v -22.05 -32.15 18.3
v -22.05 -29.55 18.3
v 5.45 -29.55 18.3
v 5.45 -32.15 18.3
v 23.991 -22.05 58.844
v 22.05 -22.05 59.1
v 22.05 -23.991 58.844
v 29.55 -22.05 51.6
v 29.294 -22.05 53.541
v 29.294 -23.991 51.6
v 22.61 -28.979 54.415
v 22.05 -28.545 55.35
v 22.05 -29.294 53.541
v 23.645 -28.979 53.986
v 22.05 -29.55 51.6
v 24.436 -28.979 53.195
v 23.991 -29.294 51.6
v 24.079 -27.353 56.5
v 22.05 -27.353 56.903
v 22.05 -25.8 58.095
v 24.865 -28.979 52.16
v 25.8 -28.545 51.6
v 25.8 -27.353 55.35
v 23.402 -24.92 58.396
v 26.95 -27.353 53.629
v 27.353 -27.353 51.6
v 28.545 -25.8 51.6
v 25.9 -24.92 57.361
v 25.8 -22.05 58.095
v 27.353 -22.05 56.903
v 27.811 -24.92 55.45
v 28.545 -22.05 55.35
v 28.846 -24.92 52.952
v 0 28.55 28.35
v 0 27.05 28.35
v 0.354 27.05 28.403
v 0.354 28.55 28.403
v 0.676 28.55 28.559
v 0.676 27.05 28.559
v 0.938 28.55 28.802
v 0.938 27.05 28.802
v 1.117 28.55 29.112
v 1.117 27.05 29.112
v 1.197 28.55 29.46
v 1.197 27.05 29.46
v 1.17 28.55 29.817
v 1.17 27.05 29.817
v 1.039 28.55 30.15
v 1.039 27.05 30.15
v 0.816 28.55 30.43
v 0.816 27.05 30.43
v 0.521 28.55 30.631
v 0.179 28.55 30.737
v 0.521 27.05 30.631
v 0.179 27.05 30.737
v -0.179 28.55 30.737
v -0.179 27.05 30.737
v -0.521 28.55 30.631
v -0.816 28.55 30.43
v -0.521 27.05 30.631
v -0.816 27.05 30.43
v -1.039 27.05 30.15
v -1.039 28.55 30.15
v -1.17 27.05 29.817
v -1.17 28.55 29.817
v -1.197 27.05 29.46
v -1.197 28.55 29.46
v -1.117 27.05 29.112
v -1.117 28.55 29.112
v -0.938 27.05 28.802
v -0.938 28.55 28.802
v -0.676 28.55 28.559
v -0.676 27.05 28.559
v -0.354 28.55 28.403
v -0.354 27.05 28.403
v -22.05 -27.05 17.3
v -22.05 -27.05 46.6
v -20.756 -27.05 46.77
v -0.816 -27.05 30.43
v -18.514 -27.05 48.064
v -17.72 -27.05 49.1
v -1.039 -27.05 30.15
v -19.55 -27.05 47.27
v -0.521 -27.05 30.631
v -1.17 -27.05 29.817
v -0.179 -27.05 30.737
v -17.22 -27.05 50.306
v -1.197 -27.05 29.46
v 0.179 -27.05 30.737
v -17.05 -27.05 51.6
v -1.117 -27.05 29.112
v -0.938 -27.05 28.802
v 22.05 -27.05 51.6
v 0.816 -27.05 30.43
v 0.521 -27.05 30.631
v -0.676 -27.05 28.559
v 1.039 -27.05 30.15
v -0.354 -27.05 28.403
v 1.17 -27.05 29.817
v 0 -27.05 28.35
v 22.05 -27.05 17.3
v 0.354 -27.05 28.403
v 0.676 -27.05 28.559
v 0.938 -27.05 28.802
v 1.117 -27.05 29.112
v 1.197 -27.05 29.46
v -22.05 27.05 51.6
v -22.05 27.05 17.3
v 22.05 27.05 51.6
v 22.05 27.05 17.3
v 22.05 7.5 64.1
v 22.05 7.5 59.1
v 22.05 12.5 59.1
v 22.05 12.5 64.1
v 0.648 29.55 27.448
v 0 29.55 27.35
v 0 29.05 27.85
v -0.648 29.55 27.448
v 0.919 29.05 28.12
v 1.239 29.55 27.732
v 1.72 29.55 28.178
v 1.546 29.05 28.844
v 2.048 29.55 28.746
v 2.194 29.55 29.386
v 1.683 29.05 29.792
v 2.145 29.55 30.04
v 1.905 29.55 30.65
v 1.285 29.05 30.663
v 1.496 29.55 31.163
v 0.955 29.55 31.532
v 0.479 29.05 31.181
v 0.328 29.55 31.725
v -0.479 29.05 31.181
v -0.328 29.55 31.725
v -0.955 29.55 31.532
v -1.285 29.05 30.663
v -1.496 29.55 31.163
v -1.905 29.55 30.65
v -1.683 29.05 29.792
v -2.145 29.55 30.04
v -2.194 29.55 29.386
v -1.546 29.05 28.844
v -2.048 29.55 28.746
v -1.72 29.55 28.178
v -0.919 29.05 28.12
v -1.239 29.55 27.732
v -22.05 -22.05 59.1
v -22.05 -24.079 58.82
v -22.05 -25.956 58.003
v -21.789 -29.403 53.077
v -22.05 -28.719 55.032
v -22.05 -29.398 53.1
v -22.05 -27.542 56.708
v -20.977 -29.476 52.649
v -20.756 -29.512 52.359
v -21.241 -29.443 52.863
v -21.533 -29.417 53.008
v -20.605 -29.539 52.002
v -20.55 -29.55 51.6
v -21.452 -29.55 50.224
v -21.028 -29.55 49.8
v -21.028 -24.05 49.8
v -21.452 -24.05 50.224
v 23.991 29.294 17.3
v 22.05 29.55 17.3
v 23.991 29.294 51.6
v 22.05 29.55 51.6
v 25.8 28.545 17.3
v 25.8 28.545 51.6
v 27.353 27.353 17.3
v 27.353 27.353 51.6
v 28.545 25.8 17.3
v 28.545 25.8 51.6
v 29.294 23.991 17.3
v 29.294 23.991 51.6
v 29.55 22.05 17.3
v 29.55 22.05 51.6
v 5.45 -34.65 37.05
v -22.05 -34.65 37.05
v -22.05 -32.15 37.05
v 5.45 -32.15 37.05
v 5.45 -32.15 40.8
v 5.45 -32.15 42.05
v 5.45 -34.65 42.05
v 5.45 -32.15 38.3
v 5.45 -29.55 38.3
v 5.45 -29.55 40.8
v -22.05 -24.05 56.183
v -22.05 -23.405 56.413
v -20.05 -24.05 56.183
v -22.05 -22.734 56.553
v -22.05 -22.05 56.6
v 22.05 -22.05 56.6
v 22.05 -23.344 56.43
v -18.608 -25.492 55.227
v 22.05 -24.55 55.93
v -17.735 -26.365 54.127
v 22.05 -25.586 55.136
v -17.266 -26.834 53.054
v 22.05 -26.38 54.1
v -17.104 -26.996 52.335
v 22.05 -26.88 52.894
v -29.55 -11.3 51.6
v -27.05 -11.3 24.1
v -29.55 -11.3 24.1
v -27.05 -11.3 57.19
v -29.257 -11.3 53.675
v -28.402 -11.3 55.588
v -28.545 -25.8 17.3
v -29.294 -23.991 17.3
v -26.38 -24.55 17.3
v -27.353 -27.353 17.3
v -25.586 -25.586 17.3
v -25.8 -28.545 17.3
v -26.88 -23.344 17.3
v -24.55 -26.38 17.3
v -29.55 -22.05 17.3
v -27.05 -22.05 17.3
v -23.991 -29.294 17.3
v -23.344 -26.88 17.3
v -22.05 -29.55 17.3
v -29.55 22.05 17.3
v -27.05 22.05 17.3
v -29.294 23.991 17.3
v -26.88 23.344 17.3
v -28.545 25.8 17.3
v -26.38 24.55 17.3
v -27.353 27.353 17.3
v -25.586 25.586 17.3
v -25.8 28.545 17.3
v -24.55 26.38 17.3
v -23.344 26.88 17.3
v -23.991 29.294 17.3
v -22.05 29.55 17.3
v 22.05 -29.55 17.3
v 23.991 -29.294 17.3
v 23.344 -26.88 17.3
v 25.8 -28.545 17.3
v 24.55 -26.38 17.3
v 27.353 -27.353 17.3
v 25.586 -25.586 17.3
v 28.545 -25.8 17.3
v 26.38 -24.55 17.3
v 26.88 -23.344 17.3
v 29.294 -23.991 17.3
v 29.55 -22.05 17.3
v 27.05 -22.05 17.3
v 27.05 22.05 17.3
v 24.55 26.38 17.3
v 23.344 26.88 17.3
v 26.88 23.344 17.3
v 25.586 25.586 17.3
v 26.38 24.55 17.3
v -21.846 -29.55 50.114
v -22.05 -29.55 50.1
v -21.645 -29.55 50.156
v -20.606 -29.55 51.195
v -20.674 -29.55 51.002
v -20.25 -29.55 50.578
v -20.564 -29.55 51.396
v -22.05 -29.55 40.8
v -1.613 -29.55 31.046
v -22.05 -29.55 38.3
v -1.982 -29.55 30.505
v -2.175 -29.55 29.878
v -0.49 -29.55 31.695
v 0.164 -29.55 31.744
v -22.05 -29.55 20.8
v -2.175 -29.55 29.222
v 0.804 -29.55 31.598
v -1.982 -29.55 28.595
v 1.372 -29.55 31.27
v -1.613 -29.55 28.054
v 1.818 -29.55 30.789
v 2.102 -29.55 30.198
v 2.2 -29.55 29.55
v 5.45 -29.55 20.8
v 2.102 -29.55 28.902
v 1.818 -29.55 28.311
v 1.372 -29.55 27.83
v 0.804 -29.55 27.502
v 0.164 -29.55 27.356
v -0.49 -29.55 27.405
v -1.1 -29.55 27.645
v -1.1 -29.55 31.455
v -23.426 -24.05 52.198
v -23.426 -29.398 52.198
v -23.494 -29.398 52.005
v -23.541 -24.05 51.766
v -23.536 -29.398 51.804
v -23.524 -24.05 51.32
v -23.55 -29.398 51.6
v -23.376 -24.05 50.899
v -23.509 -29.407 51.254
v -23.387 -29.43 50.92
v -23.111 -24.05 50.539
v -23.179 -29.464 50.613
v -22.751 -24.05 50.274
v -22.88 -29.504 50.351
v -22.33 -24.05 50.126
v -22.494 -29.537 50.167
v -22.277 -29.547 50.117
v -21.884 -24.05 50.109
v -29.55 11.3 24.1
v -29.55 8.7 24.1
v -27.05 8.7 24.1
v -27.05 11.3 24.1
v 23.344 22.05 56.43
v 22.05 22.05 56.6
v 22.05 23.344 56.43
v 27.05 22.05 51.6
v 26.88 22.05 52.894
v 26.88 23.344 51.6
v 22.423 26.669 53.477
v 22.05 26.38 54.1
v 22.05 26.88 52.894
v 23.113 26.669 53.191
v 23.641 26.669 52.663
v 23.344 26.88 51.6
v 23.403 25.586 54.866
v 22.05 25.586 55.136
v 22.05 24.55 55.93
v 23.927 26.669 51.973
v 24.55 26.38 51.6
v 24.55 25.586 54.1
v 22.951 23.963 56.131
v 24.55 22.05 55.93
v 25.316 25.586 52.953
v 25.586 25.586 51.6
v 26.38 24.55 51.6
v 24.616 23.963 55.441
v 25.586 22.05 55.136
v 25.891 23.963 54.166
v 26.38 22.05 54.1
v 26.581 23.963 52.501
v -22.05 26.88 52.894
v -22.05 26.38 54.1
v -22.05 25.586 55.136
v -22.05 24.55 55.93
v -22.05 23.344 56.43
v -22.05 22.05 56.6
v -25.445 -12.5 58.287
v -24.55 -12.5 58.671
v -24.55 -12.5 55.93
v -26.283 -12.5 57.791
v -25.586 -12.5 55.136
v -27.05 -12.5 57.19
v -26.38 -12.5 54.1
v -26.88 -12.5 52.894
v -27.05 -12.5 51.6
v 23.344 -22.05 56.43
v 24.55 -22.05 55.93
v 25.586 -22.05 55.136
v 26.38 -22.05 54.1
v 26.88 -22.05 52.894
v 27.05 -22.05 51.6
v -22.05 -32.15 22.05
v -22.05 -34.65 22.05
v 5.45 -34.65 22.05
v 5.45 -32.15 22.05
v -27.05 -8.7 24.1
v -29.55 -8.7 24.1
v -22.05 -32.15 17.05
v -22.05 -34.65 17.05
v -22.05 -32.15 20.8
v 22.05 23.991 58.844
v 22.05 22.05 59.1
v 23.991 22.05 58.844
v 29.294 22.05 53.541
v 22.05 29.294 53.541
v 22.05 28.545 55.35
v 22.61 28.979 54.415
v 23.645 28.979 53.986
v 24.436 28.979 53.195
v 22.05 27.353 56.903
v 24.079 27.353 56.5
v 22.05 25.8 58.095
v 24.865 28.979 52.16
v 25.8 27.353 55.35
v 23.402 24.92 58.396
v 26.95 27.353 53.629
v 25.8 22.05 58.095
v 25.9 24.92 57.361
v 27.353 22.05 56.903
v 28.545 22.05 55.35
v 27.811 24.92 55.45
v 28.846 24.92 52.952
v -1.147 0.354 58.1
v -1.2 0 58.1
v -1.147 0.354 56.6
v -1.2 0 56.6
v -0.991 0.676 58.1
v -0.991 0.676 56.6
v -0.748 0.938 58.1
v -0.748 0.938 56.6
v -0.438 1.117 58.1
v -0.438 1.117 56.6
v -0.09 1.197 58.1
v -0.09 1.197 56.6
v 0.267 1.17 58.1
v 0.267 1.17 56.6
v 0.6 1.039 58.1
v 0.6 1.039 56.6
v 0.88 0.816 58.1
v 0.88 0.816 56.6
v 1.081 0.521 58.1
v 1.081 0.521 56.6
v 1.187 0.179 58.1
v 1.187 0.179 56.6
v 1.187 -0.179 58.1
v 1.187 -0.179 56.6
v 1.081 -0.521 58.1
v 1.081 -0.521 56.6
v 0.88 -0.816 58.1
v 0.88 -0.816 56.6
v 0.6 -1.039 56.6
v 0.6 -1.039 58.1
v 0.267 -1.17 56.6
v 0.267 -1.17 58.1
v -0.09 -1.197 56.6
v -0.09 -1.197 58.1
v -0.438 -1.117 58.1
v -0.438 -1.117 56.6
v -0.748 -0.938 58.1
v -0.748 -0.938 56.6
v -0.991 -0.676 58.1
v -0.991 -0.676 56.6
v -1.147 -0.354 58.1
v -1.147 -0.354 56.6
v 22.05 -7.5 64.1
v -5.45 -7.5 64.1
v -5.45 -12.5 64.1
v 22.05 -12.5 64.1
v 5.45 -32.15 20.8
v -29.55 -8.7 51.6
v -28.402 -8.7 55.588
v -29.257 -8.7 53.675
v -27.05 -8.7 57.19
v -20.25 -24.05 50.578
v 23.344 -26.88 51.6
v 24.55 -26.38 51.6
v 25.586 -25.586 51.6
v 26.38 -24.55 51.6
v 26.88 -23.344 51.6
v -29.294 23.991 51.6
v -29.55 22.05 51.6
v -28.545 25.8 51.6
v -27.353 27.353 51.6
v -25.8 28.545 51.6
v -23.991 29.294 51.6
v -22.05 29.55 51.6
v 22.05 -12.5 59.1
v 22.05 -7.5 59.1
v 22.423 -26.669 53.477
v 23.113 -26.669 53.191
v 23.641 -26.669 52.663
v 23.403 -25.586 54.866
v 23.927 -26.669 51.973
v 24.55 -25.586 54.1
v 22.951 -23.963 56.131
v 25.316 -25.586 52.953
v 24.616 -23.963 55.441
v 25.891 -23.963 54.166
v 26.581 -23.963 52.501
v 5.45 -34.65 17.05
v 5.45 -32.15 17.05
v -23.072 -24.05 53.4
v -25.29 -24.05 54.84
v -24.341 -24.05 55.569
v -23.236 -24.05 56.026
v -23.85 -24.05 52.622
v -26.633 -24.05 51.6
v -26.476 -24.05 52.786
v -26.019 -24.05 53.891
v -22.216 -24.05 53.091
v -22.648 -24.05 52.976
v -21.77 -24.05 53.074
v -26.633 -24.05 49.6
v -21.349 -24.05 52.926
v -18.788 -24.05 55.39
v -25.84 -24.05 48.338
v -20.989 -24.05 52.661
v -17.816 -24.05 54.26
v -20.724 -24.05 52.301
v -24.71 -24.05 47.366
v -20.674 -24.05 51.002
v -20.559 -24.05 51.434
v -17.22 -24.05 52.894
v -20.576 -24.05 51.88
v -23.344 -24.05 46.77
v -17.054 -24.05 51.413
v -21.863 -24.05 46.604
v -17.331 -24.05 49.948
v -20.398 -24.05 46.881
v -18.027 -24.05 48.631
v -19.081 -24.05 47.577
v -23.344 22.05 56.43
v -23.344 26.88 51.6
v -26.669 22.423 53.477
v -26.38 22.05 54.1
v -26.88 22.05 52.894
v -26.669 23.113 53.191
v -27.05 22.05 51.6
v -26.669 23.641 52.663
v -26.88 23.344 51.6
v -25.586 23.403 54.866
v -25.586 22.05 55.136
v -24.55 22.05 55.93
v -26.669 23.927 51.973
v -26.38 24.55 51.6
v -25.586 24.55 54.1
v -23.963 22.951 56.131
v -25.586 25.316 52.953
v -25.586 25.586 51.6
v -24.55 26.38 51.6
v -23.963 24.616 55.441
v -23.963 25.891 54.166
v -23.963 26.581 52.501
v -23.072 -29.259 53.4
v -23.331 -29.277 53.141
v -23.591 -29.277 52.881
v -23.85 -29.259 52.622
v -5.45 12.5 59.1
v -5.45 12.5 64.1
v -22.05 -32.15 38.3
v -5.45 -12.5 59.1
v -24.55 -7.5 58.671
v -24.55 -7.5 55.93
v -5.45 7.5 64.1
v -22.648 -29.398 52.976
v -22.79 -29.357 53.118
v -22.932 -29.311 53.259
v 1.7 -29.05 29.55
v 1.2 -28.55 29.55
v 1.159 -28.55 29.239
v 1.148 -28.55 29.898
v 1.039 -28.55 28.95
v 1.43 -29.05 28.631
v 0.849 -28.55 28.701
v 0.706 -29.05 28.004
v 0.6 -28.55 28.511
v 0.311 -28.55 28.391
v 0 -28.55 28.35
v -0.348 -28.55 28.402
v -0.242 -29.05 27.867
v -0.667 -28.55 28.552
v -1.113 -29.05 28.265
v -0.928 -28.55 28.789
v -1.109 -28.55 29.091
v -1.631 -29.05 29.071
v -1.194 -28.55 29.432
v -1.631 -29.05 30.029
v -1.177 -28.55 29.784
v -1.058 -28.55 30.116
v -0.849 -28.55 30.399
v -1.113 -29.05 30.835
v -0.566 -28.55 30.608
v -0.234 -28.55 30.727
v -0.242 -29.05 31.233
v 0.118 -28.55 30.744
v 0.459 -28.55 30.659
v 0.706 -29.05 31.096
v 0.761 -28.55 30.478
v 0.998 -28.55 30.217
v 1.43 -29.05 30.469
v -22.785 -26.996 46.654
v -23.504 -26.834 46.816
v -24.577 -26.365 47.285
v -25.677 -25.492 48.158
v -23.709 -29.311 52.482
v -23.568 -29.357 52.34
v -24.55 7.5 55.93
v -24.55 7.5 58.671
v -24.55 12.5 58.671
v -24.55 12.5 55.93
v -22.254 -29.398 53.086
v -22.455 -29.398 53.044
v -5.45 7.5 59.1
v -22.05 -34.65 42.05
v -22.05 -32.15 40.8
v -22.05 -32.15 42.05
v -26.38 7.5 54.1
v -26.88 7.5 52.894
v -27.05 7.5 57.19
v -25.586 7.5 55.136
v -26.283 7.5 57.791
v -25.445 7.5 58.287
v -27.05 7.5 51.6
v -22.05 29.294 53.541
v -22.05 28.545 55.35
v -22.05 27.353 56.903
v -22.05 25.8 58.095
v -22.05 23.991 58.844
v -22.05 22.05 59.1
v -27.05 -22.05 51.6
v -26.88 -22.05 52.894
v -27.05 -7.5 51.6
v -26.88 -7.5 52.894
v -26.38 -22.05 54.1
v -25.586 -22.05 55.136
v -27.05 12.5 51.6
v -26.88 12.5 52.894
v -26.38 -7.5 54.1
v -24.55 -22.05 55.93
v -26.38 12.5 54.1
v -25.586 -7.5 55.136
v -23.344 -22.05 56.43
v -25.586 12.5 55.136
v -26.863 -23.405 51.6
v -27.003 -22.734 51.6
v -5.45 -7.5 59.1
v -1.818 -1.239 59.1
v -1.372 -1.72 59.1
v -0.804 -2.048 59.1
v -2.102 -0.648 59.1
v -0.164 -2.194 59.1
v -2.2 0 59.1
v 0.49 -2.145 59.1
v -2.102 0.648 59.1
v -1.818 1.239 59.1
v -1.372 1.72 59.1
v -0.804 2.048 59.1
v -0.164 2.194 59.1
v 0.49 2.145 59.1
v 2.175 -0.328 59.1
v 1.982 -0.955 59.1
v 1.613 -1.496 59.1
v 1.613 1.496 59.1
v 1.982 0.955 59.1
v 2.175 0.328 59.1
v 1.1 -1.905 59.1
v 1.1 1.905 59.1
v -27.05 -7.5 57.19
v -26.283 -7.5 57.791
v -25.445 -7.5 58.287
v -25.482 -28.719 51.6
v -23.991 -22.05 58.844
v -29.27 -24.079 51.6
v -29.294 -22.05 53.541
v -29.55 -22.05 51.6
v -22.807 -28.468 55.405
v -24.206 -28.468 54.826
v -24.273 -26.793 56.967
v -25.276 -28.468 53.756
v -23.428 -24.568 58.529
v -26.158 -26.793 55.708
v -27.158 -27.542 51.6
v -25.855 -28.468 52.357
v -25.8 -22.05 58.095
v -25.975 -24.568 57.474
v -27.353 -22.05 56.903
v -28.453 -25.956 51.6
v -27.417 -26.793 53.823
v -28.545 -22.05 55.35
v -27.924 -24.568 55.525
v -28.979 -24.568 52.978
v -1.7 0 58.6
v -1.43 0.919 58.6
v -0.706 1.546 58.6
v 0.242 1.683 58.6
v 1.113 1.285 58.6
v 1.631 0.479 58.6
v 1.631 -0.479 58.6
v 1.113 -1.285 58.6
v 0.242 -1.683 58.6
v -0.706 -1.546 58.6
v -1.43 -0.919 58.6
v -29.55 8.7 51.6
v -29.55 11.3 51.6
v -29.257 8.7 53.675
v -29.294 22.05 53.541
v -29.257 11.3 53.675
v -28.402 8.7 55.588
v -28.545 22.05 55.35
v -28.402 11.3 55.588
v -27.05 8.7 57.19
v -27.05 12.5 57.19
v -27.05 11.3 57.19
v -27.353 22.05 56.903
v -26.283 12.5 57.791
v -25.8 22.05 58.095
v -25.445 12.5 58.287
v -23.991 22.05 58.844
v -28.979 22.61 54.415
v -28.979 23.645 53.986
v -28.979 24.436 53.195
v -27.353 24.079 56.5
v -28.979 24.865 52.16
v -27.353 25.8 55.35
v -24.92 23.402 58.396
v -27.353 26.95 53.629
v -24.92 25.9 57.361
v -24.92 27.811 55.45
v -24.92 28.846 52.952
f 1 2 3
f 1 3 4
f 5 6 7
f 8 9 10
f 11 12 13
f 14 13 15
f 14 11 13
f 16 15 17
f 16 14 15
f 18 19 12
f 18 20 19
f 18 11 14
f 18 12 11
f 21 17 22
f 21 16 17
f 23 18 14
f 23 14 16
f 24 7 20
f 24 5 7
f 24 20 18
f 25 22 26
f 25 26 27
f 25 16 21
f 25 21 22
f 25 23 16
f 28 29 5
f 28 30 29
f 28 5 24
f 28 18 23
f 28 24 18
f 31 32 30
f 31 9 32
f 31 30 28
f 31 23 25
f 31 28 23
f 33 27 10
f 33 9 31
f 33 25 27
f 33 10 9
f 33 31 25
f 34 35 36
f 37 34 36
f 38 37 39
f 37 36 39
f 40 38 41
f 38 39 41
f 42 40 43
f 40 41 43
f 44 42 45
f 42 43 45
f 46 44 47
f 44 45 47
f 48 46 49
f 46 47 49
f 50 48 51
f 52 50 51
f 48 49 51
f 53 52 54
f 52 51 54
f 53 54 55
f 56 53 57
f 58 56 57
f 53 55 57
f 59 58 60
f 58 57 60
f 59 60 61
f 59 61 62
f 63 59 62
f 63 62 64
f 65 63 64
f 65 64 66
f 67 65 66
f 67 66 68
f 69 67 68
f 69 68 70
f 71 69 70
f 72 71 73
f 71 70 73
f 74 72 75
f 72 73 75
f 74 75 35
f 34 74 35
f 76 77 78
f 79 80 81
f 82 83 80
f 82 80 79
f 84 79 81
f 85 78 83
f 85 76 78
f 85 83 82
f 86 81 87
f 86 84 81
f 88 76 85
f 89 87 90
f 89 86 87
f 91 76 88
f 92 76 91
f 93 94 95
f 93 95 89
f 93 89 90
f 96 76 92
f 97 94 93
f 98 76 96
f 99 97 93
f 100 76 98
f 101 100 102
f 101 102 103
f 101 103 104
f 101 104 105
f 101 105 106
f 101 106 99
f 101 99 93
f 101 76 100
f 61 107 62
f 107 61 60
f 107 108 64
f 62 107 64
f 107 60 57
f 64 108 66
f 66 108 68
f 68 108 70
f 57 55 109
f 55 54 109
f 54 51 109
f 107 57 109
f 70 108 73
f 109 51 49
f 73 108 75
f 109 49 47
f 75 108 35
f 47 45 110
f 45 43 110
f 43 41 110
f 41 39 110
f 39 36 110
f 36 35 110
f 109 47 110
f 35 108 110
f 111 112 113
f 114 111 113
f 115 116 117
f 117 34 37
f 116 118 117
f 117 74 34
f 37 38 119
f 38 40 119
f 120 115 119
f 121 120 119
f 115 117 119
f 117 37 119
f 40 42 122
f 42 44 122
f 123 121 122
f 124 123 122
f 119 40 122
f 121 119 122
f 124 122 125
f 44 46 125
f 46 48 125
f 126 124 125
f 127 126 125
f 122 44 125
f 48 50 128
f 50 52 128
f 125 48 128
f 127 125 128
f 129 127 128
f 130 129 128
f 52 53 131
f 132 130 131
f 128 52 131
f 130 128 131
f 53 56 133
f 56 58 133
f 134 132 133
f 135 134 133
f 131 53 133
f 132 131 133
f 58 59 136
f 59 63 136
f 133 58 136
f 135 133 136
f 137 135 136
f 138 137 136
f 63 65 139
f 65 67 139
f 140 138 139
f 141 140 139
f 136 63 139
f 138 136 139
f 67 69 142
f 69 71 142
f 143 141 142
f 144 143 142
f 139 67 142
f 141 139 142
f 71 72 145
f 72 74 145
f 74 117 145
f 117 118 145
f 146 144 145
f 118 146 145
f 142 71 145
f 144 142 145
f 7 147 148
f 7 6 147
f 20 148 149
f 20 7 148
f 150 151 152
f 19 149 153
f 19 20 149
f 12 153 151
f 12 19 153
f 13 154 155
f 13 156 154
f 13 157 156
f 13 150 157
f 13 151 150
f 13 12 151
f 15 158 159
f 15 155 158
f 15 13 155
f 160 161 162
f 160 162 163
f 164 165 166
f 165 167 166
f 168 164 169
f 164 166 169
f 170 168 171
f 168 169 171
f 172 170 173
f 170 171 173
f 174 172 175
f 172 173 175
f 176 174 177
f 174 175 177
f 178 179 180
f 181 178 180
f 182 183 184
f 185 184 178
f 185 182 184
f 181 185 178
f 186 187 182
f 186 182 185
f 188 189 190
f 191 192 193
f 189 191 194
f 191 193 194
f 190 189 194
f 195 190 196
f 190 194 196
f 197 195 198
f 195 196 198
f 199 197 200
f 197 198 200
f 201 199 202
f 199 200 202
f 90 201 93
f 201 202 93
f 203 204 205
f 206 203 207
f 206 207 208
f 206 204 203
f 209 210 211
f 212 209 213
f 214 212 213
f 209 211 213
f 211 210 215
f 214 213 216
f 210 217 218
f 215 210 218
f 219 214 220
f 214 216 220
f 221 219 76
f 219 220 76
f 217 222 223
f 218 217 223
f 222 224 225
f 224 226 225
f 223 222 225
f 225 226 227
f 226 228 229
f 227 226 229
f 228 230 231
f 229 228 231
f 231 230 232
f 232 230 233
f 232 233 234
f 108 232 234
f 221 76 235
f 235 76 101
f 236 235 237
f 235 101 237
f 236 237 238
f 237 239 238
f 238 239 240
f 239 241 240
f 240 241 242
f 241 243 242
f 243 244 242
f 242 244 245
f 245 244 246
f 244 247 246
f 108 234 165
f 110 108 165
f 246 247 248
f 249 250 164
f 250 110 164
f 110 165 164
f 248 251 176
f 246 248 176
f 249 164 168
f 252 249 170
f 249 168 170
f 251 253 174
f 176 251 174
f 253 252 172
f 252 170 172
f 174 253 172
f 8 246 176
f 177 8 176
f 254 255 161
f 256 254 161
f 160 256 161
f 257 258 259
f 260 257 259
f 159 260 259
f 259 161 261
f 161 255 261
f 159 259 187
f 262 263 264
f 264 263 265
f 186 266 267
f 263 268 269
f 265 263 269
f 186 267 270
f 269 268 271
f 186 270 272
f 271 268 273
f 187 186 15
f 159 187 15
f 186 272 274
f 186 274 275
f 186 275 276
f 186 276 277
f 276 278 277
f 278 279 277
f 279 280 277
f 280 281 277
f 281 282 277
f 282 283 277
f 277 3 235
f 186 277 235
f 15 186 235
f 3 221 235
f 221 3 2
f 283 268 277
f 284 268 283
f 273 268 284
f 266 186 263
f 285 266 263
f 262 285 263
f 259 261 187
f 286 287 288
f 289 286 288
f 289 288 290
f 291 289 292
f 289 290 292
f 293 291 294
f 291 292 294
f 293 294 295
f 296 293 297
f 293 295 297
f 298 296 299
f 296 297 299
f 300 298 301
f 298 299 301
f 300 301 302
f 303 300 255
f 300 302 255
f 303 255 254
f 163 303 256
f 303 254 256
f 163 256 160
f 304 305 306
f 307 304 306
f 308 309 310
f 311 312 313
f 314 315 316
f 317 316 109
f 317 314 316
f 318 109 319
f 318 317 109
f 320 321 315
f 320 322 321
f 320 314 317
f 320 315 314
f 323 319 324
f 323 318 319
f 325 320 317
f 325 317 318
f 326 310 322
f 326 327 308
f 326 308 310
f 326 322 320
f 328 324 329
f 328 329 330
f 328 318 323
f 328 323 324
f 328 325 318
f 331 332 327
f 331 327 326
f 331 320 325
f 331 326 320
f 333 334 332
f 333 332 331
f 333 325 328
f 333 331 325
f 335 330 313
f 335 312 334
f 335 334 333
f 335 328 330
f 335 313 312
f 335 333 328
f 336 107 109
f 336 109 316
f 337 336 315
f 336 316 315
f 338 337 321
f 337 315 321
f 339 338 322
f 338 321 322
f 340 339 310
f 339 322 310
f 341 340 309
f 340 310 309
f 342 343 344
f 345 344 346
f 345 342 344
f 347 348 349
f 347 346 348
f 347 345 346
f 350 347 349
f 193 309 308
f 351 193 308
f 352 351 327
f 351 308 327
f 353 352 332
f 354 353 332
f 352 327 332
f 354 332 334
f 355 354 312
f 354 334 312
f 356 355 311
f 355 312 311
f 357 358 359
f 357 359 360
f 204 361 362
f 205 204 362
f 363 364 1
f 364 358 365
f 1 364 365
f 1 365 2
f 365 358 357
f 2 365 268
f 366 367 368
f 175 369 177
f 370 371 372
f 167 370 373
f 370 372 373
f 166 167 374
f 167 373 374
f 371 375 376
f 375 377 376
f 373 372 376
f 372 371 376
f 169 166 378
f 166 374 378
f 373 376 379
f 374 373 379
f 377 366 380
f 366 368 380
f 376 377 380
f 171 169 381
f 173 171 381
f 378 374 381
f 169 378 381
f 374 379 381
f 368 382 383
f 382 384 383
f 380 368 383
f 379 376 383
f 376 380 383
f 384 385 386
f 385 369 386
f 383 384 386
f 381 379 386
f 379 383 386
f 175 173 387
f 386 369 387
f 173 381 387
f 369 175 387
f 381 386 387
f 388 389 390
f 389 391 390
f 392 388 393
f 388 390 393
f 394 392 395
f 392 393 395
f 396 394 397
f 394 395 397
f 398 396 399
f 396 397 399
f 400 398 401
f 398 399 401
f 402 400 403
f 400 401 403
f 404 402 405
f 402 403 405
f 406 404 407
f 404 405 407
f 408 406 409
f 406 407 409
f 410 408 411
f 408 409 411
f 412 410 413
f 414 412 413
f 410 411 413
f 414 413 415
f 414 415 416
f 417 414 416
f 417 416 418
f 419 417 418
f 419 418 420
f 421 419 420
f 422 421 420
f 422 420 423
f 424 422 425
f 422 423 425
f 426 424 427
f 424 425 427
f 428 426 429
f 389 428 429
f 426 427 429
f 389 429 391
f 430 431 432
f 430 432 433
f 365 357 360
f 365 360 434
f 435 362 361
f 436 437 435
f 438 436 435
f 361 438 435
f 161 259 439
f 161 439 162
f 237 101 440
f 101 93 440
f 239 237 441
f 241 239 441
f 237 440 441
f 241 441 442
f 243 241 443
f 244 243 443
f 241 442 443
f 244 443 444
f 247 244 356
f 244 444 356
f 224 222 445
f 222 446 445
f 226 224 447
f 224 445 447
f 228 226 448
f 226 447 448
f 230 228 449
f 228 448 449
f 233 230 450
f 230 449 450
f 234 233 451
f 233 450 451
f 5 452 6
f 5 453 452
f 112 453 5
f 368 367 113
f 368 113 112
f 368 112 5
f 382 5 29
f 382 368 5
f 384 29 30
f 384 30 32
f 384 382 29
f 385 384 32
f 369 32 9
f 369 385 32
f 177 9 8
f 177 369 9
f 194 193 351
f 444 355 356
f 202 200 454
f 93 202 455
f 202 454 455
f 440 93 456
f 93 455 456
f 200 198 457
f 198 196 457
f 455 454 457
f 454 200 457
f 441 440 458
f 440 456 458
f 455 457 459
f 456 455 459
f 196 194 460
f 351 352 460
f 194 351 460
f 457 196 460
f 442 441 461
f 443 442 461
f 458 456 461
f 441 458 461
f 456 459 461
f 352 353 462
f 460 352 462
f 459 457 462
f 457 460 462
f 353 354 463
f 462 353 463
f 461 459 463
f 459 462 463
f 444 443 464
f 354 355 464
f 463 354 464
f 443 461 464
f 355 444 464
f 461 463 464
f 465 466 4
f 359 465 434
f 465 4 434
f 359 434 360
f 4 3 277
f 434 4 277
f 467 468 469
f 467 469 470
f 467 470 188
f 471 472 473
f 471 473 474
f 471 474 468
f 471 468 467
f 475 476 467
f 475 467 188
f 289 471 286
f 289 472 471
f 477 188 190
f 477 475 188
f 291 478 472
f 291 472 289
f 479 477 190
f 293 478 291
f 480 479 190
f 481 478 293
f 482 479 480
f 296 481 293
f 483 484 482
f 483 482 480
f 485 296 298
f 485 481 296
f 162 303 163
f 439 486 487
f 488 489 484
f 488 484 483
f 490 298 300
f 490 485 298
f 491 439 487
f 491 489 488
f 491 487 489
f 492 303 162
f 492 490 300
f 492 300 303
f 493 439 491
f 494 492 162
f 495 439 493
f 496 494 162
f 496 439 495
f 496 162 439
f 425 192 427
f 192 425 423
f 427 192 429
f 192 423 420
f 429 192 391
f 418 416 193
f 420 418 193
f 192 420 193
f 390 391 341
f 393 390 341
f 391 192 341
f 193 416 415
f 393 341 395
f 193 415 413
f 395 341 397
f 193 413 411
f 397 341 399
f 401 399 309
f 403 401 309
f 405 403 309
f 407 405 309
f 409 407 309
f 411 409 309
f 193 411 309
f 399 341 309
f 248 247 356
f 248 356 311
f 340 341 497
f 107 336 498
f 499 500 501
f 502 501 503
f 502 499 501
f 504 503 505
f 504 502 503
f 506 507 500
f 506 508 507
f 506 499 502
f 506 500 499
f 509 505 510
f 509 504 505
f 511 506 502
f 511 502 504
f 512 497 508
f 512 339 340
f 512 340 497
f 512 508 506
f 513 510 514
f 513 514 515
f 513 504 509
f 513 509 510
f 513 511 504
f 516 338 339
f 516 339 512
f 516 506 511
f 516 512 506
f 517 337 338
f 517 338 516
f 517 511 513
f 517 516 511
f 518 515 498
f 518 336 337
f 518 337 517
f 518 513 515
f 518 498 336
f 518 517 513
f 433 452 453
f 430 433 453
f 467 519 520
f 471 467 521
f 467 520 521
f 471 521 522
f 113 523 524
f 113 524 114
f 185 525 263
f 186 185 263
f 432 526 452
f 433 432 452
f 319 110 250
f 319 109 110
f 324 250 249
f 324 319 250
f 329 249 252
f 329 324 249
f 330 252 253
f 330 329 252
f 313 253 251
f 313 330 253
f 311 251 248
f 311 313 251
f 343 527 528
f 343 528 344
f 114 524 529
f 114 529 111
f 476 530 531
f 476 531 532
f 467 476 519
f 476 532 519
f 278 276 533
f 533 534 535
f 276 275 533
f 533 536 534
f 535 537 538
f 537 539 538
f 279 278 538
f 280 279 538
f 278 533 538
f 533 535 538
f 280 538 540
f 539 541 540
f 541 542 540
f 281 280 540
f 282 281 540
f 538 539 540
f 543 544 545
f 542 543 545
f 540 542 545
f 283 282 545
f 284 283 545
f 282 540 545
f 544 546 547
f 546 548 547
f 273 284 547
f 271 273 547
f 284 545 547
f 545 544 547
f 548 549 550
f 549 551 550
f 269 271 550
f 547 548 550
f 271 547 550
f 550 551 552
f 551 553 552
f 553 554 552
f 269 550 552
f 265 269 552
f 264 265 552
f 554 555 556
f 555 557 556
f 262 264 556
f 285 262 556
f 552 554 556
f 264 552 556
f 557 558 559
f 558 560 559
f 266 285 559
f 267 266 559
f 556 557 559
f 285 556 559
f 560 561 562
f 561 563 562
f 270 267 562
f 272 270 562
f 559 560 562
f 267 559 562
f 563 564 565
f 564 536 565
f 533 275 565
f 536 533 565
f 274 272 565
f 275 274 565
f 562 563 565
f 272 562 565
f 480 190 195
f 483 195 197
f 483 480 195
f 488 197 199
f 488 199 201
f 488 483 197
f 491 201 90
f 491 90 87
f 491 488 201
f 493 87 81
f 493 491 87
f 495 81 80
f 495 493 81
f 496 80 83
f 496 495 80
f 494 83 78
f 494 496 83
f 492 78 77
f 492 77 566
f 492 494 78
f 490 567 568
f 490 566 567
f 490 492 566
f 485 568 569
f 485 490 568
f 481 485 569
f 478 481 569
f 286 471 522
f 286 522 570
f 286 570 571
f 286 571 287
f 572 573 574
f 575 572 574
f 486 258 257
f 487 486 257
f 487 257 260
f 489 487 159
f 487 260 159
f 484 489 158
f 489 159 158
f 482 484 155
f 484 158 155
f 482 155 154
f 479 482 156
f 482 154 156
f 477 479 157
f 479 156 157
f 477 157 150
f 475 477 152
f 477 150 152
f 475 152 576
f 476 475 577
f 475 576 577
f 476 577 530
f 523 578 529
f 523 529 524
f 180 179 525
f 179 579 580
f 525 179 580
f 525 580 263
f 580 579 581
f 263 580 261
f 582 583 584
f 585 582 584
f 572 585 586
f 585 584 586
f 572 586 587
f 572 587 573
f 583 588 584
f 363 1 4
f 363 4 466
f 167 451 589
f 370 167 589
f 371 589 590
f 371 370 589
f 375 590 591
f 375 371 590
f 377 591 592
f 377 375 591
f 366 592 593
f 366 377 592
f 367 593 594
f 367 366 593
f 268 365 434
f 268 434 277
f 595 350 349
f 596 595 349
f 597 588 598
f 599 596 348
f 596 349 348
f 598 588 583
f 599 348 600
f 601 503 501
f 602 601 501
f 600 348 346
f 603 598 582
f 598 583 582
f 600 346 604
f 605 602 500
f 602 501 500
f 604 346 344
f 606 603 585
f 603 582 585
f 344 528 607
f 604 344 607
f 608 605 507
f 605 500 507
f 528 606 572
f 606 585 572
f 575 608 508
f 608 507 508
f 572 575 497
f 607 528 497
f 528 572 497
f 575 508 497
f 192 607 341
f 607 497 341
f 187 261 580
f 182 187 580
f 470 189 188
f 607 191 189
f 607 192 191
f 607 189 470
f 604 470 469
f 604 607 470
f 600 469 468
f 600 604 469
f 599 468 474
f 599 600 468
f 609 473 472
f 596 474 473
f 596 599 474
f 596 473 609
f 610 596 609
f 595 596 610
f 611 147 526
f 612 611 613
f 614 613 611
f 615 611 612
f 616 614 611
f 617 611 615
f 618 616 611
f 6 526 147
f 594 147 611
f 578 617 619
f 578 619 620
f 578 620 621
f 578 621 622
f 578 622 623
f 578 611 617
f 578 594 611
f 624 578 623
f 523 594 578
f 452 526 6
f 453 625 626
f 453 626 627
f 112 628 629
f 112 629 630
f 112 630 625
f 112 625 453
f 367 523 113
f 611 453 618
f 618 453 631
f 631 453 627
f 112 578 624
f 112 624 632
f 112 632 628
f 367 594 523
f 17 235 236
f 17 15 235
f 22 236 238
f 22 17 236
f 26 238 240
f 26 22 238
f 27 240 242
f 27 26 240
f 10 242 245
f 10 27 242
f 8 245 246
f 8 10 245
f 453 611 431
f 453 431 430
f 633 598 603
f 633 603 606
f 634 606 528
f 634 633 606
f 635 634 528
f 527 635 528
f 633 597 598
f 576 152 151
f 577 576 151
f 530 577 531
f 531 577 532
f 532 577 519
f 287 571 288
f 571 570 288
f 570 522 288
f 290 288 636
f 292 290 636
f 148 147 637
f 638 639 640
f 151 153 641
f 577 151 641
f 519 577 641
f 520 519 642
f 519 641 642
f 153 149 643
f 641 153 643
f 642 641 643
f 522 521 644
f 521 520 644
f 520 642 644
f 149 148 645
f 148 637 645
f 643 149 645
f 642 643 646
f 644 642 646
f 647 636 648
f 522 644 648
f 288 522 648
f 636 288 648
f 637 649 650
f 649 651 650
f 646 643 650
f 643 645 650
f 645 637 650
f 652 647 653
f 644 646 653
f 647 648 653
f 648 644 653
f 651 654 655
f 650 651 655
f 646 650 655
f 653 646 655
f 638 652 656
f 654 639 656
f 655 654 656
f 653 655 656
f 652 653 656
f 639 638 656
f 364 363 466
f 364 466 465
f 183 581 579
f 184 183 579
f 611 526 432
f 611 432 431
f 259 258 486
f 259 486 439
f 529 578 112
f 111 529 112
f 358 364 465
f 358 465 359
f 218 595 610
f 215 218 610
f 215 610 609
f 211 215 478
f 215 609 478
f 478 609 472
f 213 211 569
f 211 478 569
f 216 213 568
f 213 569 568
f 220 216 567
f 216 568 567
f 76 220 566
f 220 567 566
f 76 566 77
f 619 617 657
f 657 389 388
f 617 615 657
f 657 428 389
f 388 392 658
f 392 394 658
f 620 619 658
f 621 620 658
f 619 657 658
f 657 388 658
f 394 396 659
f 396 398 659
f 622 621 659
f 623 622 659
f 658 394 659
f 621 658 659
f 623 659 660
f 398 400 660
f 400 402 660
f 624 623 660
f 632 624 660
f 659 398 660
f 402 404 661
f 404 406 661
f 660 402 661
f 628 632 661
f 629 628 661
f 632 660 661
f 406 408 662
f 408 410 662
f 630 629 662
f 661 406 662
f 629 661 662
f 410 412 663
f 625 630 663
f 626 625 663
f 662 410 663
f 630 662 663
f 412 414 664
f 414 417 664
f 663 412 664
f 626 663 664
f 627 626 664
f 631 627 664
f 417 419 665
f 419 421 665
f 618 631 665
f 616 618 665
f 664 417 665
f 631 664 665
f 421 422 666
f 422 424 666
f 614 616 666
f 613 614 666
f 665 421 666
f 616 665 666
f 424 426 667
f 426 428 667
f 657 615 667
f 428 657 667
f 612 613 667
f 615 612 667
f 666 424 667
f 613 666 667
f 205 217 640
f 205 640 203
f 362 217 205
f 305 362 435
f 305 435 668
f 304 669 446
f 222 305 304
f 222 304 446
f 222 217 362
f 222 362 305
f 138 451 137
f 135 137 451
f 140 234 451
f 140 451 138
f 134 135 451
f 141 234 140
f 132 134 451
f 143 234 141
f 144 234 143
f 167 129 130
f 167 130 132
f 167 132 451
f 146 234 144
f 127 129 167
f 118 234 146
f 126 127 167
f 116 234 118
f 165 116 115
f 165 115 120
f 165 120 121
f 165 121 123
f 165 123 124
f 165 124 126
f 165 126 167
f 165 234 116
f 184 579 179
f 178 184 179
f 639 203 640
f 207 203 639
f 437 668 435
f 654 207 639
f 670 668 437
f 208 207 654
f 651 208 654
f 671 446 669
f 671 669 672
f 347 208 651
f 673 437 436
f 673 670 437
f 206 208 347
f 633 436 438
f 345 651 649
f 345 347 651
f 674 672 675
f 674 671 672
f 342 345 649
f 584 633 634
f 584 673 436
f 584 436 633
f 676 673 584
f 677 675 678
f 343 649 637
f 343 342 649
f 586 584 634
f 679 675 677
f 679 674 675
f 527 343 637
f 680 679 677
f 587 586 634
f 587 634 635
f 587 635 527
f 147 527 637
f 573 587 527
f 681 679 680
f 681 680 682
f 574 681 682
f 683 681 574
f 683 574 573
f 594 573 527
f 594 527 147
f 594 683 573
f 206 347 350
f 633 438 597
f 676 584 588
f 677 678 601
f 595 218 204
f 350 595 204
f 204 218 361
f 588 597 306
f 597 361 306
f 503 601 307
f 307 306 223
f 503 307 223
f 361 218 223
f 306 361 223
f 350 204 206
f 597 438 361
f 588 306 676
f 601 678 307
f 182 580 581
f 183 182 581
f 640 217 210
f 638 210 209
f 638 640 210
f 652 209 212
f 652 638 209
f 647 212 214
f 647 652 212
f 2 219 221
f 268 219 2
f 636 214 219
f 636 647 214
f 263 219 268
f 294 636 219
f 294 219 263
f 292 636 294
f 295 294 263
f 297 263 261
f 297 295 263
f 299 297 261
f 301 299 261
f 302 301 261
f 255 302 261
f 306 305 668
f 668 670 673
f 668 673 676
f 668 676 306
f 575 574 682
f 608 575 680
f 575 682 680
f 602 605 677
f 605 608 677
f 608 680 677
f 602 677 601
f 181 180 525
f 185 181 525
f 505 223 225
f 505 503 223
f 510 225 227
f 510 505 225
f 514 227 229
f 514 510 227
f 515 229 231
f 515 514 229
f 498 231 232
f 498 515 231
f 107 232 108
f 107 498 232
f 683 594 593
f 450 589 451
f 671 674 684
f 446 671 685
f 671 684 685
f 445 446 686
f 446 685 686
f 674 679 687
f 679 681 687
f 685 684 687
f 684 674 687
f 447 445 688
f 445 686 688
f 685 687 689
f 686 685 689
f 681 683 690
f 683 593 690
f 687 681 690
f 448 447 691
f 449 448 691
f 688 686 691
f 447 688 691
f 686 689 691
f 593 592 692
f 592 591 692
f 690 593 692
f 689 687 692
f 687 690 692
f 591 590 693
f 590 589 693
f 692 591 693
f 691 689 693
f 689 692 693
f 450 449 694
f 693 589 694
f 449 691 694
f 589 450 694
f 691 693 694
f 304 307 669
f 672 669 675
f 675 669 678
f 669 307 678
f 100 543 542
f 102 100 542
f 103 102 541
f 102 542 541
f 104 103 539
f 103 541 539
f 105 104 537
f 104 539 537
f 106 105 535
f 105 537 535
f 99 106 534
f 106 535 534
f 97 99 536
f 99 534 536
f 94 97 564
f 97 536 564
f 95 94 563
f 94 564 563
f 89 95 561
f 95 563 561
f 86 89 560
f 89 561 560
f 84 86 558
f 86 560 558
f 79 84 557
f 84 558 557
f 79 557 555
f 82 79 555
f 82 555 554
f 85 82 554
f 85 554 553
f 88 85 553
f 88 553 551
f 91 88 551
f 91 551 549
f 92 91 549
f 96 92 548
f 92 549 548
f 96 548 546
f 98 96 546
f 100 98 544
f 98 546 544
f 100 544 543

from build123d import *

# Parameters (mm, degrees)
SKETCH1_W                                            = 59.1
SKETCH1_H                                            = 59.1
BOSS_EXTRUDE1_DEPTH                                  = 59.1
CUT_EXTRUDE1_START                                   = -2.25
SKETCH2_W                                            = 116.357411776
SKETCH2_H                                            = 94.431830133
CUT_EXTRUDE1_DEPTH                                   = 71.232302632
FILLET1_R                                            = 7.5
SHELL1_T                                             = -2.5
CUT_EXTRUDE7_DEPTH                                   = 35
BOSS_EXTRUDE2_START                                  = 3
SKETCH18_R                                           = 5
BOSS_EXTRUDE2_DEPTH                                  = 3
SKETCH17_R                                           = 1.5
CUT_EXTRUDE10_DEPTH                                  = 10
CUT_EXTRUDE11_REACH                                  = 90.65
CSK_SLOT_FOR_M2_COUNTERSUNK_FLAT_HEAD_SC_D           = 2.4
CSK_SLOT_FOR_M2_COUNTERSUNK_FLAT_HEAD_SC_CSINK_D     = 4.4
CSK_SLOT_FOR_M2_COUNTERSUNK_FLAT_HEAD_SC_CSINK_ANGLE = 90
CSK_SLOT_FOR_M2_COUNTERSUNK_FLAT_HEA_2_D             = 2.4
CSK_SLOT_FOR_M2_COUNTERSUNK_FLAT_HEA_2_CSINK_D       = 4.4
CSK_SLOT_FOR_M2_COUNTERSUNK_FLAT_HEA_2_CSINK_ANGLE   = 90
CSK_SLOT_FOR_M2_COUNTERSUNK_FLAT_HEA_3_D             = 2.4
CSK_SLOT_FOR_M2_COUNTERSUNK_FLAT_HEA_3_CSINK_D       = 4.4
CSK_SLOT_FOR_M2_COUNTERSUNK_FLAT_HEA_3_CSINK_ANGLE   = 90
BOSS_EXTRUDE3_DEPTH                                  = 35
SKETCH28_W                                           = 7.5
SKETCH28_H                                           = 5.1
CUT_EXTRUDE12_DEPTH                                  = 62.984090748
SKETCH29_W                                           = 27.5
SKETCH29_H                                           = 5
BOSS_EXTRUDE4_DEPTH                                  = 5


with BuildPart() as part:
    # Sketch1 → Boss-Extrude1 (new body)
    with BuildSketch(Plane.XY):
        Rectangle(SKETCH1_W, SKETCH1_H)
    extrude(amount=BOSS_EXTRUDE1_DEPTH)

    # Sketch2 → Cut-Extrude1 (cut, through all)
    with BuildSketch(Plane(origin=(-13.400446417, -13.400446417, 19.55), x_dir=(0.9659258262890684, -0.2588190451025203, 0), z_dir=(0, 0, 1)).offset(CUT_EXTRUDE1_START)):
        with Locations((15.241895832, 15.980077556)):
            Rectangle(SKETCH2_W, SKETCH2_H)
    extrude(amount=-CUT_EXTRUDE1_DEPTH, mode=Mode.SUBTRACT)

    # Fillet1
    fillet1_edges = [part.edges().sort_by_distance(p)[0] for p in [
        (29.55, 0, 59.1),
        (0, 29.55, 59.1),
        (-29.55, 0, 59.1),
        (0, -29.55, 59.1),
        (-29.55, 29.55, 38.2),
        (29.55, 29.55, 38.2),
        (29.55, -29.55, 38.2),
        (-29.55, -29.55, 38.2),
    ]]
    fillet(fillet1_edges, radius=FILLET1_R)

    # Shell1
    shell1_openings = [part.faces().sort_by_distance(p)[0] for p in [
        (0, 0, 17.3),
    ]]
    offset(amount=SHELL1_T, openings=shell1_openings, kind=Kind.INTERSECTION)

    # Sketch14 → Cut-Extrude7 (cut)
    with BuildSketch(Plane.XY.offset(59.1)):
        Polygon((-29.55, -8.7), (-27.05, -8.7), (-27.05, -7.5), (-24.55, -7.5), (-24.55, -12.5), (-27.05, -12.5), (-27.05, -11.3), (-29.55, -11.3), align=None)
        Polygon((-29.55, 11.3), (-29.55, 8.7), (-27.05, 8.7), (-27.05, 7.5), (-24.55, 7.5), (-24.55, 12.5), (-27.05, 12.5), (-27.05, 11.3), align=None)
    extrude(amount=-CUT_EXTRUDE7_DEPTH, mode=Mode.SUBTRACT)

    # Sketch18 → Boss-Extrude2 (add)
    with BuildSketch(Plane(origin=(0, -27.05, 0), x_dir=(1, 0, 0), z_dir=(0, 1, 0)).offset(BOSS_EXTRUDE2_START)):
        with Locations((-22.05, -51.6)):
            Circle(SKETCH18_R)
    extrude(amount=-BOSS_EXTRUDE2_DEPTH)

    # Sketch17 → Cut-Extrude10 (cut)
    with BuildSketch(Plane.XZ.offset(29.55)):
        with Locations(Location((-22.05, 51.6, 0), (0, 0, 90))):
            Circle(SKETCH17_R)
    extrude(amount=-CUT_EXTRUDE10_DEPTH, mode=Mode.SUBTRACT)

    # Sketch20 → Cut-Extrude11 (cut, up to next)
    with BuildSketch(Plane.XZ.offset(29.55), mode=Mode.PRIVATE) as cut_extrude11_sk1:
        with BuildLine():
            Line((-22.647878988, 52.975696447), (-23.072143057, 53.399960516))
            Line((-23.072143057, 53.399960516), (-23.849960516, 52.622143057))
            Line((-23.849960516, 52.622143057), (-23.425696447, 52.197878988))
            ThreePointArc((-23.425696447, 52.197878988), (-23.110660172, 52.660660172), (-22.647878988, 52.975696447))
        make_face()
    cut_extrude11_tool1 = extrude(cut_extrude11_sk1.sketch, amount=-CUT_EXTRUDE11_REACH, mode=Mode.PRIVATE) & part.part
    # Sketch20 → Cut-Extrude11 (cut, up to next)
    with BuildSketch(Plane.XZ.offset(29.55), mode=Mode.PRIVATE) as cut_extrude11_sk2:
        with BuildLine():
            Line((-21.027856943, 49.800039484), (-21.452121012, 50.224303553))
            ThreePointArc((-21.452121012, 50.224303553), (-20.989339828, 50.539339828), (-20.674303553, 51.002121012))
            Line((-20.674303553, 51.002121012), (-20.250039484, 50.577856943))
            Line((-20.250039484, 50.577856943), (-21.027856943, 49.800039484))
        make_face()
    cut_extrude11_tool2 = extrude(cut_extrude11_sk2.sketch, amount=-CUT_EXTRUDE11_REACH, mode=Mode.PRIVATE) & part.part
    add(cut_extrude11_tool1.solids().sort_by_distance((-23.27308, -29.55, 52.82308))[0], mode=Mode.SUBTRACT)
    add(cut_extrude11_tool2.solids().sort_by_distance((-20.82692, -29.55, 50.37692))[0], mode=Mode.SUBTRACT)

    # CSK SLOT for M2 Countersunk Flat Head Sc (through all)
    with Locations(Plane.ZX.offset(29.55)):
        with Locations((29.55, 0)):
            CounterSinkHole(CSK_SLOT_FOR_M2_COUNTERSUNK_FLAT_HEAD_SC_D / 2, CSK_SLOT_FOR_M2_COUNTERSUNK_FLAT_HEAD_SC_CSINK_D / 2, counter_sink_angle=CSK_SLOT_FOR_M2_COUNTERSUNK_FLAT_HEAD_SC_CSINK_ANGLE)

    # CSK SLOT for M2 Countersunk Flat Hea 2 (through all)
    with Locations(Plane.XY.offset(59.1)):
        with Locations((0, 0)):
            CounterSinkHole(CSK_SLOT_FOR_M2_COUNTERSUNK_FLAT_HEA_2_D / 2, CSK_SLOT_FOR_M2_COUNTERSUNK_FLAT_HEA_2_CSINK_D / 2, counter_sink_angle=CSK_SLOT_FOR_M2_COUNTERSUNK_FLAT_HEA_2_CSINK_ANGLE)

    # CSK SLOT for M2 Countersunk Flat Hea 3 (through all)
    with Locations(Plane(origin=(0, -29.55, 0), x_dir=(-1, 0, 0), z_dir=(0, -1, 0))):
        with Locations((0, -29.55)):
            CounterSinkHole(CSK_SLOT_FOR_M2_COUNTERSUNK_FLAT_HEA_3_D / 2, CSK_SLOT_FOR_M2_COUNTERSUNK_FLAT_HEA_3_CSINK_D / 2, counter_sink_angle=CSK_SLOT_FOR_M2_COUNTERSUNK_FLAT_HEA_3_CSINK_ANGLE)

    # Sketch27 → Boss-Extrude3 (add)
    with BuildSketch(Plane(origin=(-29.55, 29.55, 0), x_dir=(0, 0, -1), z_dir=(1, 0, 0))):
        Polygon((-18.3, -59.1), (-18.3, -61.7), (-17.05, -61.7), (-17.05, -64.2), (-22.05, -64.2), (-22.05, -61.7), (-20.8, -61.7), (-20.8, -59.1), align=None)
        Polygon((-38.3, -59.1), (-40.8, -59.1), (-40.8, -61.7), (-42.05, -61.7), (-42.05, -64.2), (-37.05, -64.2), (-37.05, -61.7), (-38.3, -61.7), align=None)
    extrude(amount=BOSS_EXTRUDE3_DEPTH)

    # Sketch28 → Cut-Extrude12 (cut, through all)
    with BuildSketch(Plane.XY.offset(59.1)):
        with Locations((-25.8, -32.1)):
            Rectangle(SKETCH28_W, SKETCH28_H)
    extrude(amount=-CUT_EXTRUDE12_DEPTH, mode=Mode.SUBTRACT)

    # Sketch29 → Boss-Extrude4 (add)
    with BuildSketch(Plane.XY.offset(59.1)):
        with Locations((8.3, -10)):
            Rectangle(SKETCH29_W, SKETCH29_H)
        with Locations((8.3, 10)):
            Rectangle(SKETCH29_W, SKETCH29_H)
    extrude(amount=BOSS_EXTRUDE4_DEPTH)


solid = part.part
